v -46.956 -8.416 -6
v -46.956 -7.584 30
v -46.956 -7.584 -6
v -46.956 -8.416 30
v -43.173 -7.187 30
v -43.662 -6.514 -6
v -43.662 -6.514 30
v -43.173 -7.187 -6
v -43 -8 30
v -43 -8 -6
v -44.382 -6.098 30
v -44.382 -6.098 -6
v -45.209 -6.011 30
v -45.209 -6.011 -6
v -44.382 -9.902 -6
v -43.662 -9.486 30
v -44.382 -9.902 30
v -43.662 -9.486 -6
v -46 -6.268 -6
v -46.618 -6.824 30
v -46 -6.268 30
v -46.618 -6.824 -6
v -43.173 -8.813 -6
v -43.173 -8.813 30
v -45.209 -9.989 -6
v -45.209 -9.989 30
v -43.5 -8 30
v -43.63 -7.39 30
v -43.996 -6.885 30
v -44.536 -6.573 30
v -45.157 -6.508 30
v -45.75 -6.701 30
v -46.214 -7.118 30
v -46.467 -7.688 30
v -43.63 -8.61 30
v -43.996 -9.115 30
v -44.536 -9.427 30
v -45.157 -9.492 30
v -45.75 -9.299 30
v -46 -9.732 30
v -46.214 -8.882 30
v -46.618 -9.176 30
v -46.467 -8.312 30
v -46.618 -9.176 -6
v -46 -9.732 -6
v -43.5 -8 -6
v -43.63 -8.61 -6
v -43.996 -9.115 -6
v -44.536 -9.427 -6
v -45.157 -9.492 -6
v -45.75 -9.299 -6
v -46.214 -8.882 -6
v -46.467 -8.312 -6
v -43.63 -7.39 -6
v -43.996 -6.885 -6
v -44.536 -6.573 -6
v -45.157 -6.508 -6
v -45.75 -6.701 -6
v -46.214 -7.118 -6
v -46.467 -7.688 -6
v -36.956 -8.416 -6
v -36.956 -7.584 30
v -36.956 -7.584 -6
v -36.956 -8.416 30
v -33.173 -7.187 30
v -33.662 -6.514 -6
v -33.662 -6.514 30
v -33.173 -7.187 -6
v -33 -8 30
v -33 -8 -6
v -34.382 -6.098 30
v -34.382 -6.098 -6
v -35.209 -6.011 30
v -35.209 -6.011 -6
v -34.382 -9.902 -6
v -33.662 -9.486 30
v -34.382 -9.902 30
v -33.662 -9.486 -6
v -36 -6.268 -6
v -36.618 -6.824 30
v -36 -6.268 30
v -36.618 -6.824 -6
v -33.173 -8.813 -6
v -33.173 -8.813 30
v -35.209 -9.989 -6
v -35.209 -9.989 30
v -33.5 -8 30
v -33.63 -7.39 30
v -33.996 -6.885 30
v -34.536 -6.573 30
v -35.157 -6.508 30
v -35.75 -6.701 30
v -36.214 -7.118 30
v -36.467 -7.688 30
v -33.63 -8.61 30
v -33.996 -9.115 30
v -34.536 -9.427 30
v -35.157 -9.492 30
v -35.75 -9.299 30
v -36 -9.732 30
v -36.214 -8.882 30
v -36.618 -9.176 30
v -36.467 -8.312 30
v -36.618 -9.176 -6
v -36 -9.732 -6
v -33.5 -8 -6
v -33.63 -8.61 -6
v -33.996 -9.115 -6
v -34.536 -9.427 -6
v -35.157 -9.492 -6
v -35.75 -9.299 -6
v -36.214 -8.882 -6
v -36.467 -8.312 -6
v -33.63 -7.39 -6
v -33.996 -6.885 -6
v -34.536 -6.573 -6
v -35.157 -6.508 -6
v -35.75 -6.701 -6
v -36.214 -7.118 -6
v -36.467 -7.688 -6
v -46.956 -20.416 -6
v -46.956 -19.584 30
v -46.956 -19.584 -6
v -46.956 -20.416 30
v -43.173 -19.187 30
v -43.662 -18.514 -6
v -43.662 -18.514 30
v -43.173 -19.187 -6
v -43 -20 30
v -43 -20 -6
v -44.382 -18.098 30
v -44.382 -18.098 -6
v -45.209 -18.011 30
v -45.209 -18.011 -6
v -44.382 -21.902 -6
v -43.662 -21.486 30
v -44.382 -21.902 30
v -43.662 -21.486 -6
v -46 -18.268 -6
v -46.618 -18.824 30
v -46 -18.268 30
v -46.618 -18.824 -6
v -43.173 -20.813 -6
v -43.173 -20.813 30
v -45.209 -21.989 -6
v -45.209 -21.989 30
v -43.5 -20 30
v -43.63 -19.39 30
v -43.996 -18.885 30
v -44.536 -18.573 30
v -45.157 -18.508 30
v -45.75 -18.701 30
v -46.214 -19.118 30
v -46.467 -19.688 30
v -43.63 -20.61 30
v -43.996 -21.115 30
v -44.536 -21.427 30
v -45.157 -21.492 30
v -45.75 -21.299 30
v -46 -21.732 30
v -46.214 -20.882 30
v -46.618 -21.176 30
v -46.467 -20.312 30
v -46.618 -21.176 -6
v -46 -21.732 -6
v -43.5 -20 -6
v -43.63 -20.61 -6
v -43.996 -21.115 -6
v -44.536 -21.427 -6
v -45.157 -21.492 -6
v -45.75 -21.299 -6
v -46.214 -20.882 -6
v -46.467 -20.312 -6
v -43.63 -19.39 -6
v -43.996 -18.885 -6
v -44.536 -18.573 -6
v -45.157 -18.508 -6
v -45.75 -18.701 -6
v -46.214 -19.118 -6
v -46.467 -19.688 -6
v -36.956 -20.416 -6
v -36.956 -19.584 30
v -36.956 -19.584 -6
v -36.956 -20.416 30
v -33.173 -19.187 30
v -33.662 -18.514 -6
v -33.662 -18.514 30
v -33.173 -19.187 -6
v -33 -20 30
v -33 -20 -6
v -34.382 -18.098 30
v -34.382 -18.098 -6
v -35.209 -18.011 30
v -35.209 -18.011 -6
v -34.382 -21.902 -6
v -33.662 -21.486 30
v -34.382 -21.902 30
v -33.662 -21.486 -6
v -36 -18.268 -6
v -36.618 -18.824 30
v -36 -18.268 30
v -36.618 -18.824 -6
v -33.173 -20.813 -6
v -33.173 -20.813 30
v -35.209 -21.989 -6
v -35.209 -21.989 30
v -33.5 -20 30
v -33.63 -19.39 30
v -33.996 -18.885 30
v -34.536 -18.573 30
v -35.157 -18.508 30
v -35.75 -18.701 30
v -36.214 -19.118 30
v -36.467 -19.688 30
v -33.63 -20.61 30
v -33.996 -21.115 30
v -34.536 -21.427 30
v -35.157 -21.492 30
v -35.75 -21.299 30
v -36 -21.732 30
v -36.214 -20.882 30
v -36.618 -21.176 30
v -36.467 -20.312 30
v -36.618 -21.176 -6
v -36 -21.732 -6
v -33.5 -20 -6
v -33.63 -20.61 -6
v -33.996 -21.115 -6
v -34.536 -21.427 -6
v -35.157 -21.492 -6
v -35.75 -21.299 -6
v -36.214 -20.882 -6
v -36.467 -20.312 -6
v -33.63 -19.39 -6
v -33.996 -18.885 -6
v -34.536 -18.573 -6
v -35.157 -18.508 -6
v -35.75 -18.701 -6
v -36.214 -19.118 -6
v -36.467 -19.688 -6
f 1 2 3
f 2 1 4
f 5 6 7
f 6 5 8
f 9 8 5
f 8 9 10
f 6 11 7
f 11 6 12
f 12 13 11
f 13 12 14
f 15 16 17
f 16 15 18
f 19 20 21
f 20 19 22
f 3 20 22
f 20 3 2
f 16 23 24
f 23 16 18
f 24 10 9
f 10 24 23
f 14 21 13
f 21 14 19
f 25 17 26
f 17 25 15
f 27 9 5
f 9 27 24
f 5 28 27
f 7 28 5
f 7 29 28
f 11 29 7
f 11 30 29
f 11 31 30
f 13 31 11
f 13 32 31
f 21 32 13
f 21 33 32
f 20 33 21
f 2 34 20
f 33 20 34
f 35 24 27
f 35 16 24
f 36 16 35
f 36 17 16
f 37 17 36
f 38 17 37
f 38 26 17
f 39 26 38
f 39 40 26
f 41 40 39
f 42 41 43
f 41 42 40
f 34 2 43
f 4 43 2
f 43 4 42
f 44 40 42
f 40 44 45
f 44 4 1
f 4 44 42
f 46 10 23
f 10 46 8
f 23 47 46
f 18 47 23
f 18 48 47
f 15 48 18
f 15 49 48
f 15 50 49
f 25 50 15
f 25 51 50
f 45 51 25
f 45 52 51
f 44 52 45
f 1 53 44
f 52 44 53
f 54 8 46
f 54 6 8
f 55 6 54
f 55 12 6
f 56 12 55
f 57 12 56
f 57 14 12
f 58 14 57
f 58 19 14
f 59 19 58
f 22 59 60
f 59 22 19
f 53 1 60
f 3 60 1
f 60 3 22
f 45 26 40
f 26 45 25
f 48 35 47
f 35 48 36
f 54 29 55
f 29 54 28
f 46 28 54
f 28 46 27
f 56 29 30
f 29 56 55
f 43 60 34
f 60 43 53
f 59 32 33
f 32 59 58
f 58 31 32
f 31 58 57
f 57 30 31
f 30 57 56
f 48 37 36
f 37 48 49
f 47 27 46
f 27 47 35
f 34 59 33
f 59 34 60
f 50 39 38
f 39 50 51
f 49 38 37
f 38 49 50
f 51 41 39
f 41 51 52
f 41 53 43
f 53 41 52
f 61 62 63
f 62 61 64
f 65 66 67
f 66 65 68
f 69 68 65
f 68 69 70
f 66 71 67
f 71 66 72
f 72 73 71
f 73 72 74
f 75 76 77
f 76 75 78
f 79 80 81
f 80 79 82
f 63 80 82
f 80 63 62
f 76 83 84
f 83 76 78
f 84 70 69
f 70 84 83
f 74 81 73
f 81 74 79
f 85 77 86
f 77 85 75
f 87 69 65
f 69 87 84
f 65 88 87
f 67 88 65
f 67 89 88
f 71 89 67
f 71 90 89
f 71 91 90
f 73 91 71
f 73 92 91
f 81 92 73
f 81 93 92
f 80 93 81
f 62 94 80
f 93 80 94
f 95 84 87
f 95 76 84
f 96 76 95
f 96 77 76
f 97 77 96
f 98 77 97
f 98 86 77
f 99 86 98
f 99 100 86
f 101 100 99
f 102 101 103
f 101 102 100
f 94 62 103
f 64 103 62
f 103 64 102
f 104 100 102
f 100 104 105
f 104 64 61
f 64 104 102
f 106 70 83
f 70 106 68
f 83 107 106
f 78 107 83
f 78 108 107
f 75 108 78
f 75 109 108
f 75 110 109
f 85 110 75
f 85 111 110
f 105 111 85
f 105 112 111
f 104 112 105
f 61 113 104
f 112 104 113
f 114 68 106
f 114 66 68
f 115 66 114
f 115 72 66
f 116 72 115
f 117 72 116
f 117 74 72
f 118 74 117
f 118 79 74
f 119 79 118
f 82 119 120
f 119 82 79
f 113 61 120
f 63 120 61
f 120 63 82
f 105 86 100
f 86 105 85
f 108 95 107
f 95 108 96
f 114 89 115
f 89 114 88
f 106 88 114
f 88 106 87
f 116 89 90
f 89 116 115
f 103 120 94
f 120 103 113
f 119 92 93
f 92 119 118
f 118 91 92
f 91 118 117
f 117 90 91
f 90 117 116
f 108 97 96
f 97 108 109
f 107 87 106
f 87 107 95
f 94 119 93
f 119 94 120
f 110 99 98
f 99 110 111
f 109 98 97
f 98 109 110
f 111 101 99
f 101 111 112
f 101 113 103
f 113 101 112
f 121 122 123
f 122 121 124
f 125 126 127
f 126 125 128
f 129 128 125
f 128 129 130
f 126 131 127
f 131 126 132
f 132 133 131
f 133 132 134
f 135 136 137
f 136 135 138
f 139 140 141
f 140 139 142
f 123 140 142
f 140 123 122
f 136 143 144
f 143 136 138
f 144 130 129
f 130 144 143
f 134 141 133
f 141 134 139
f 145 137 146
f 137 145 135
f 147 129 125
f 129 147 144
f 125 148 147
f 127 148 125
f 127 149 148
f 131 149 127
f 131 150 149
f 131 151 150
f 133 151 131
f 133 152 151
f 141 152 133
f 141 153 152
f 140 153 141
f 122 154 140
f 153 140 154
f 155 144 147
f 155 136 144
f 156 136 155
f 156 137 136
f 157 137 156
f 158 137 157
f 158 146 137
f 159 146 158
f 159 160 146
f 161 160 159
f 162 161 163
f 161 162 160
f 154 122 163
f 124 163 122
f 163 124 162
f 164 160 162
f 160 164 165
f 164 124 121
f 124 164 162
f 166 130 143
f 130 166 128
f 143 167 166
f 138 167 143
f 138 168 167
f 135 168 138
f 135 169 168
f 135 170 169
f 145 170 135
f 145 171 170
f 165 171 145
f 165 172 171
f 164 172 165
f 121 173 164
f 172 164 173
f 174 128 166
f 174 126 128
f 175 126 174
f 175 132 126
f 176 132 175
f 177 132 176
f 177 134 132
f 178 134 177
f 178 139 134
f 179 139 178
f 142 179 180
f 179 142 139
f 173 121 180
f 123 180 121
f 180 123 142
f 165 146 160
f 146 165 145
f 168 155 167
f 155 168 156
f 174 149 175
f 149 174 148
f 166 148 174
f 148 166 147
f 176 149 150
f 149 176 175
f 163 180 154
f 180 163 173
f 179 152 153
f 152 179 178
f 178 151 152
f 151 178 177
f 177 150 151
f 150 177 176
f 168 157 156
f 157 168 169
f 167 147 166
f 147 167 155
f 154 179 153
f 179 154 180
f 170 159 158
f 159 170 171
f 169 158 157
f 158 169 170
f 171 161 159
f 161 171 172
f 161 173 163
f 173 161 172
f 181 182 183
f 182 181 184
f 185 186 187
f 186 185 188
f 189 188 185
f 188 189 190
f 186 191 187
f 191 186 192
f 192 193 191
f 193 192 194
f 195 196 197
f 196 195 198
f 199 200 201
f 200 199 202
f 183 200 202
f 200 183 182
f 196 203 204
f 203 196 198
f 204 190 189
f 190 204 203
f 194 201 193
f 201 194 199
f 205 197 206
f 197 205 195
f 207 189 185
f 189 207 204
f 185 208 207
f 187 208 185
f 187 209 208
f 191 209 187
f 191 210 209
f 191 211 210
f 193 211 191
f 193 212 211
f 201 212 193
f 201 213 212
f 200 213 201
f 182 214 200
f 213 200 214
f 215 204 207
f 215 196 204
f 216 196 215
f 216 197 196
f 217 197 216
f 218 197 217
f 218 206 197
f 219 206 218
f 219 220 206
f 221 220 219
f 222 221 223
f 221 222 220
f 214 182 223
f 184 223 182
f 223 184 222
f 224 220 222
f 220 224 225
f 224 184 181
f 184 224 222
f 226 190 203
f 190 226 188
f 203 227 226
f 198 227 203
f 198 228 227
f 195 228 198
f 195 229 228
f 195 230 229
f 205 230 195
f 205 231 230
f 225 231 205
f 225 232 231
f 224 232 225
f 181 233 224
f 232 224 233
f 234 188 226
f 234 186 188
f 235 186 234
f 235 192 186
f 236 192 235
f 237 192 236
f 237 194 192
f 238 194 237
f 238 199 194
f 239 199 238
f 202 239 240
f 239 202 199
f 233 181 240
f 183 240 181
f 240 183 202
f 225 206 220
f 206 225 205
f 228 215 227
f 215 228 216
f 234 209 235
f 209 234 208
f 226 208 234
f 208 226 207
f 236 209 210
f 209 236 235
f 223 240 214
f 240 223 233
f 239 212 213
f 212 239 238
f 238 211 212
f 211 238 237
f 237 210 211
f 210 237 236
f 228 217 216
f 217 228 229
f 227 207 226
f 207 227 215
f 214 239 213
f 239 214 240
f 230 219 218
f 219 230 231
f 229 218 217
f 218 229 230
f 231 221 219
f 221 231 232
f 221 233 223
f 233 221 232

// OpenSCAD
alturaCilindros = 18;
dmCilindros = 4;
distancia = 10;

//Pieza
module pieza(){
    cylinder(h= alturaCilindros*2, d = dmCilindros, center = true, $fn=15);
}
//Repeticiones
for (i = [1 : 2])
 {      
     difference(){
         translate([-55+(i*distancia), -8, 12])
         pieza();
          translate([-55+(i*distancia), -8 , 12])
            cylinder(h= alturaCilindros*2, d =      dmCilindros-1, center = true, $fn=15);
     }
 }

 for (i = [1 : 2])
 {
     difference(){
        translate([-55+(i*distancia), -20 , 12])
        pieza();
        translate([-55+(i*distancia), -20 , 12])
        cylinder(h= alturaCilindros*2, d =      dmCilindros-1, center = true, $fn=15);
     }
 }   
 
